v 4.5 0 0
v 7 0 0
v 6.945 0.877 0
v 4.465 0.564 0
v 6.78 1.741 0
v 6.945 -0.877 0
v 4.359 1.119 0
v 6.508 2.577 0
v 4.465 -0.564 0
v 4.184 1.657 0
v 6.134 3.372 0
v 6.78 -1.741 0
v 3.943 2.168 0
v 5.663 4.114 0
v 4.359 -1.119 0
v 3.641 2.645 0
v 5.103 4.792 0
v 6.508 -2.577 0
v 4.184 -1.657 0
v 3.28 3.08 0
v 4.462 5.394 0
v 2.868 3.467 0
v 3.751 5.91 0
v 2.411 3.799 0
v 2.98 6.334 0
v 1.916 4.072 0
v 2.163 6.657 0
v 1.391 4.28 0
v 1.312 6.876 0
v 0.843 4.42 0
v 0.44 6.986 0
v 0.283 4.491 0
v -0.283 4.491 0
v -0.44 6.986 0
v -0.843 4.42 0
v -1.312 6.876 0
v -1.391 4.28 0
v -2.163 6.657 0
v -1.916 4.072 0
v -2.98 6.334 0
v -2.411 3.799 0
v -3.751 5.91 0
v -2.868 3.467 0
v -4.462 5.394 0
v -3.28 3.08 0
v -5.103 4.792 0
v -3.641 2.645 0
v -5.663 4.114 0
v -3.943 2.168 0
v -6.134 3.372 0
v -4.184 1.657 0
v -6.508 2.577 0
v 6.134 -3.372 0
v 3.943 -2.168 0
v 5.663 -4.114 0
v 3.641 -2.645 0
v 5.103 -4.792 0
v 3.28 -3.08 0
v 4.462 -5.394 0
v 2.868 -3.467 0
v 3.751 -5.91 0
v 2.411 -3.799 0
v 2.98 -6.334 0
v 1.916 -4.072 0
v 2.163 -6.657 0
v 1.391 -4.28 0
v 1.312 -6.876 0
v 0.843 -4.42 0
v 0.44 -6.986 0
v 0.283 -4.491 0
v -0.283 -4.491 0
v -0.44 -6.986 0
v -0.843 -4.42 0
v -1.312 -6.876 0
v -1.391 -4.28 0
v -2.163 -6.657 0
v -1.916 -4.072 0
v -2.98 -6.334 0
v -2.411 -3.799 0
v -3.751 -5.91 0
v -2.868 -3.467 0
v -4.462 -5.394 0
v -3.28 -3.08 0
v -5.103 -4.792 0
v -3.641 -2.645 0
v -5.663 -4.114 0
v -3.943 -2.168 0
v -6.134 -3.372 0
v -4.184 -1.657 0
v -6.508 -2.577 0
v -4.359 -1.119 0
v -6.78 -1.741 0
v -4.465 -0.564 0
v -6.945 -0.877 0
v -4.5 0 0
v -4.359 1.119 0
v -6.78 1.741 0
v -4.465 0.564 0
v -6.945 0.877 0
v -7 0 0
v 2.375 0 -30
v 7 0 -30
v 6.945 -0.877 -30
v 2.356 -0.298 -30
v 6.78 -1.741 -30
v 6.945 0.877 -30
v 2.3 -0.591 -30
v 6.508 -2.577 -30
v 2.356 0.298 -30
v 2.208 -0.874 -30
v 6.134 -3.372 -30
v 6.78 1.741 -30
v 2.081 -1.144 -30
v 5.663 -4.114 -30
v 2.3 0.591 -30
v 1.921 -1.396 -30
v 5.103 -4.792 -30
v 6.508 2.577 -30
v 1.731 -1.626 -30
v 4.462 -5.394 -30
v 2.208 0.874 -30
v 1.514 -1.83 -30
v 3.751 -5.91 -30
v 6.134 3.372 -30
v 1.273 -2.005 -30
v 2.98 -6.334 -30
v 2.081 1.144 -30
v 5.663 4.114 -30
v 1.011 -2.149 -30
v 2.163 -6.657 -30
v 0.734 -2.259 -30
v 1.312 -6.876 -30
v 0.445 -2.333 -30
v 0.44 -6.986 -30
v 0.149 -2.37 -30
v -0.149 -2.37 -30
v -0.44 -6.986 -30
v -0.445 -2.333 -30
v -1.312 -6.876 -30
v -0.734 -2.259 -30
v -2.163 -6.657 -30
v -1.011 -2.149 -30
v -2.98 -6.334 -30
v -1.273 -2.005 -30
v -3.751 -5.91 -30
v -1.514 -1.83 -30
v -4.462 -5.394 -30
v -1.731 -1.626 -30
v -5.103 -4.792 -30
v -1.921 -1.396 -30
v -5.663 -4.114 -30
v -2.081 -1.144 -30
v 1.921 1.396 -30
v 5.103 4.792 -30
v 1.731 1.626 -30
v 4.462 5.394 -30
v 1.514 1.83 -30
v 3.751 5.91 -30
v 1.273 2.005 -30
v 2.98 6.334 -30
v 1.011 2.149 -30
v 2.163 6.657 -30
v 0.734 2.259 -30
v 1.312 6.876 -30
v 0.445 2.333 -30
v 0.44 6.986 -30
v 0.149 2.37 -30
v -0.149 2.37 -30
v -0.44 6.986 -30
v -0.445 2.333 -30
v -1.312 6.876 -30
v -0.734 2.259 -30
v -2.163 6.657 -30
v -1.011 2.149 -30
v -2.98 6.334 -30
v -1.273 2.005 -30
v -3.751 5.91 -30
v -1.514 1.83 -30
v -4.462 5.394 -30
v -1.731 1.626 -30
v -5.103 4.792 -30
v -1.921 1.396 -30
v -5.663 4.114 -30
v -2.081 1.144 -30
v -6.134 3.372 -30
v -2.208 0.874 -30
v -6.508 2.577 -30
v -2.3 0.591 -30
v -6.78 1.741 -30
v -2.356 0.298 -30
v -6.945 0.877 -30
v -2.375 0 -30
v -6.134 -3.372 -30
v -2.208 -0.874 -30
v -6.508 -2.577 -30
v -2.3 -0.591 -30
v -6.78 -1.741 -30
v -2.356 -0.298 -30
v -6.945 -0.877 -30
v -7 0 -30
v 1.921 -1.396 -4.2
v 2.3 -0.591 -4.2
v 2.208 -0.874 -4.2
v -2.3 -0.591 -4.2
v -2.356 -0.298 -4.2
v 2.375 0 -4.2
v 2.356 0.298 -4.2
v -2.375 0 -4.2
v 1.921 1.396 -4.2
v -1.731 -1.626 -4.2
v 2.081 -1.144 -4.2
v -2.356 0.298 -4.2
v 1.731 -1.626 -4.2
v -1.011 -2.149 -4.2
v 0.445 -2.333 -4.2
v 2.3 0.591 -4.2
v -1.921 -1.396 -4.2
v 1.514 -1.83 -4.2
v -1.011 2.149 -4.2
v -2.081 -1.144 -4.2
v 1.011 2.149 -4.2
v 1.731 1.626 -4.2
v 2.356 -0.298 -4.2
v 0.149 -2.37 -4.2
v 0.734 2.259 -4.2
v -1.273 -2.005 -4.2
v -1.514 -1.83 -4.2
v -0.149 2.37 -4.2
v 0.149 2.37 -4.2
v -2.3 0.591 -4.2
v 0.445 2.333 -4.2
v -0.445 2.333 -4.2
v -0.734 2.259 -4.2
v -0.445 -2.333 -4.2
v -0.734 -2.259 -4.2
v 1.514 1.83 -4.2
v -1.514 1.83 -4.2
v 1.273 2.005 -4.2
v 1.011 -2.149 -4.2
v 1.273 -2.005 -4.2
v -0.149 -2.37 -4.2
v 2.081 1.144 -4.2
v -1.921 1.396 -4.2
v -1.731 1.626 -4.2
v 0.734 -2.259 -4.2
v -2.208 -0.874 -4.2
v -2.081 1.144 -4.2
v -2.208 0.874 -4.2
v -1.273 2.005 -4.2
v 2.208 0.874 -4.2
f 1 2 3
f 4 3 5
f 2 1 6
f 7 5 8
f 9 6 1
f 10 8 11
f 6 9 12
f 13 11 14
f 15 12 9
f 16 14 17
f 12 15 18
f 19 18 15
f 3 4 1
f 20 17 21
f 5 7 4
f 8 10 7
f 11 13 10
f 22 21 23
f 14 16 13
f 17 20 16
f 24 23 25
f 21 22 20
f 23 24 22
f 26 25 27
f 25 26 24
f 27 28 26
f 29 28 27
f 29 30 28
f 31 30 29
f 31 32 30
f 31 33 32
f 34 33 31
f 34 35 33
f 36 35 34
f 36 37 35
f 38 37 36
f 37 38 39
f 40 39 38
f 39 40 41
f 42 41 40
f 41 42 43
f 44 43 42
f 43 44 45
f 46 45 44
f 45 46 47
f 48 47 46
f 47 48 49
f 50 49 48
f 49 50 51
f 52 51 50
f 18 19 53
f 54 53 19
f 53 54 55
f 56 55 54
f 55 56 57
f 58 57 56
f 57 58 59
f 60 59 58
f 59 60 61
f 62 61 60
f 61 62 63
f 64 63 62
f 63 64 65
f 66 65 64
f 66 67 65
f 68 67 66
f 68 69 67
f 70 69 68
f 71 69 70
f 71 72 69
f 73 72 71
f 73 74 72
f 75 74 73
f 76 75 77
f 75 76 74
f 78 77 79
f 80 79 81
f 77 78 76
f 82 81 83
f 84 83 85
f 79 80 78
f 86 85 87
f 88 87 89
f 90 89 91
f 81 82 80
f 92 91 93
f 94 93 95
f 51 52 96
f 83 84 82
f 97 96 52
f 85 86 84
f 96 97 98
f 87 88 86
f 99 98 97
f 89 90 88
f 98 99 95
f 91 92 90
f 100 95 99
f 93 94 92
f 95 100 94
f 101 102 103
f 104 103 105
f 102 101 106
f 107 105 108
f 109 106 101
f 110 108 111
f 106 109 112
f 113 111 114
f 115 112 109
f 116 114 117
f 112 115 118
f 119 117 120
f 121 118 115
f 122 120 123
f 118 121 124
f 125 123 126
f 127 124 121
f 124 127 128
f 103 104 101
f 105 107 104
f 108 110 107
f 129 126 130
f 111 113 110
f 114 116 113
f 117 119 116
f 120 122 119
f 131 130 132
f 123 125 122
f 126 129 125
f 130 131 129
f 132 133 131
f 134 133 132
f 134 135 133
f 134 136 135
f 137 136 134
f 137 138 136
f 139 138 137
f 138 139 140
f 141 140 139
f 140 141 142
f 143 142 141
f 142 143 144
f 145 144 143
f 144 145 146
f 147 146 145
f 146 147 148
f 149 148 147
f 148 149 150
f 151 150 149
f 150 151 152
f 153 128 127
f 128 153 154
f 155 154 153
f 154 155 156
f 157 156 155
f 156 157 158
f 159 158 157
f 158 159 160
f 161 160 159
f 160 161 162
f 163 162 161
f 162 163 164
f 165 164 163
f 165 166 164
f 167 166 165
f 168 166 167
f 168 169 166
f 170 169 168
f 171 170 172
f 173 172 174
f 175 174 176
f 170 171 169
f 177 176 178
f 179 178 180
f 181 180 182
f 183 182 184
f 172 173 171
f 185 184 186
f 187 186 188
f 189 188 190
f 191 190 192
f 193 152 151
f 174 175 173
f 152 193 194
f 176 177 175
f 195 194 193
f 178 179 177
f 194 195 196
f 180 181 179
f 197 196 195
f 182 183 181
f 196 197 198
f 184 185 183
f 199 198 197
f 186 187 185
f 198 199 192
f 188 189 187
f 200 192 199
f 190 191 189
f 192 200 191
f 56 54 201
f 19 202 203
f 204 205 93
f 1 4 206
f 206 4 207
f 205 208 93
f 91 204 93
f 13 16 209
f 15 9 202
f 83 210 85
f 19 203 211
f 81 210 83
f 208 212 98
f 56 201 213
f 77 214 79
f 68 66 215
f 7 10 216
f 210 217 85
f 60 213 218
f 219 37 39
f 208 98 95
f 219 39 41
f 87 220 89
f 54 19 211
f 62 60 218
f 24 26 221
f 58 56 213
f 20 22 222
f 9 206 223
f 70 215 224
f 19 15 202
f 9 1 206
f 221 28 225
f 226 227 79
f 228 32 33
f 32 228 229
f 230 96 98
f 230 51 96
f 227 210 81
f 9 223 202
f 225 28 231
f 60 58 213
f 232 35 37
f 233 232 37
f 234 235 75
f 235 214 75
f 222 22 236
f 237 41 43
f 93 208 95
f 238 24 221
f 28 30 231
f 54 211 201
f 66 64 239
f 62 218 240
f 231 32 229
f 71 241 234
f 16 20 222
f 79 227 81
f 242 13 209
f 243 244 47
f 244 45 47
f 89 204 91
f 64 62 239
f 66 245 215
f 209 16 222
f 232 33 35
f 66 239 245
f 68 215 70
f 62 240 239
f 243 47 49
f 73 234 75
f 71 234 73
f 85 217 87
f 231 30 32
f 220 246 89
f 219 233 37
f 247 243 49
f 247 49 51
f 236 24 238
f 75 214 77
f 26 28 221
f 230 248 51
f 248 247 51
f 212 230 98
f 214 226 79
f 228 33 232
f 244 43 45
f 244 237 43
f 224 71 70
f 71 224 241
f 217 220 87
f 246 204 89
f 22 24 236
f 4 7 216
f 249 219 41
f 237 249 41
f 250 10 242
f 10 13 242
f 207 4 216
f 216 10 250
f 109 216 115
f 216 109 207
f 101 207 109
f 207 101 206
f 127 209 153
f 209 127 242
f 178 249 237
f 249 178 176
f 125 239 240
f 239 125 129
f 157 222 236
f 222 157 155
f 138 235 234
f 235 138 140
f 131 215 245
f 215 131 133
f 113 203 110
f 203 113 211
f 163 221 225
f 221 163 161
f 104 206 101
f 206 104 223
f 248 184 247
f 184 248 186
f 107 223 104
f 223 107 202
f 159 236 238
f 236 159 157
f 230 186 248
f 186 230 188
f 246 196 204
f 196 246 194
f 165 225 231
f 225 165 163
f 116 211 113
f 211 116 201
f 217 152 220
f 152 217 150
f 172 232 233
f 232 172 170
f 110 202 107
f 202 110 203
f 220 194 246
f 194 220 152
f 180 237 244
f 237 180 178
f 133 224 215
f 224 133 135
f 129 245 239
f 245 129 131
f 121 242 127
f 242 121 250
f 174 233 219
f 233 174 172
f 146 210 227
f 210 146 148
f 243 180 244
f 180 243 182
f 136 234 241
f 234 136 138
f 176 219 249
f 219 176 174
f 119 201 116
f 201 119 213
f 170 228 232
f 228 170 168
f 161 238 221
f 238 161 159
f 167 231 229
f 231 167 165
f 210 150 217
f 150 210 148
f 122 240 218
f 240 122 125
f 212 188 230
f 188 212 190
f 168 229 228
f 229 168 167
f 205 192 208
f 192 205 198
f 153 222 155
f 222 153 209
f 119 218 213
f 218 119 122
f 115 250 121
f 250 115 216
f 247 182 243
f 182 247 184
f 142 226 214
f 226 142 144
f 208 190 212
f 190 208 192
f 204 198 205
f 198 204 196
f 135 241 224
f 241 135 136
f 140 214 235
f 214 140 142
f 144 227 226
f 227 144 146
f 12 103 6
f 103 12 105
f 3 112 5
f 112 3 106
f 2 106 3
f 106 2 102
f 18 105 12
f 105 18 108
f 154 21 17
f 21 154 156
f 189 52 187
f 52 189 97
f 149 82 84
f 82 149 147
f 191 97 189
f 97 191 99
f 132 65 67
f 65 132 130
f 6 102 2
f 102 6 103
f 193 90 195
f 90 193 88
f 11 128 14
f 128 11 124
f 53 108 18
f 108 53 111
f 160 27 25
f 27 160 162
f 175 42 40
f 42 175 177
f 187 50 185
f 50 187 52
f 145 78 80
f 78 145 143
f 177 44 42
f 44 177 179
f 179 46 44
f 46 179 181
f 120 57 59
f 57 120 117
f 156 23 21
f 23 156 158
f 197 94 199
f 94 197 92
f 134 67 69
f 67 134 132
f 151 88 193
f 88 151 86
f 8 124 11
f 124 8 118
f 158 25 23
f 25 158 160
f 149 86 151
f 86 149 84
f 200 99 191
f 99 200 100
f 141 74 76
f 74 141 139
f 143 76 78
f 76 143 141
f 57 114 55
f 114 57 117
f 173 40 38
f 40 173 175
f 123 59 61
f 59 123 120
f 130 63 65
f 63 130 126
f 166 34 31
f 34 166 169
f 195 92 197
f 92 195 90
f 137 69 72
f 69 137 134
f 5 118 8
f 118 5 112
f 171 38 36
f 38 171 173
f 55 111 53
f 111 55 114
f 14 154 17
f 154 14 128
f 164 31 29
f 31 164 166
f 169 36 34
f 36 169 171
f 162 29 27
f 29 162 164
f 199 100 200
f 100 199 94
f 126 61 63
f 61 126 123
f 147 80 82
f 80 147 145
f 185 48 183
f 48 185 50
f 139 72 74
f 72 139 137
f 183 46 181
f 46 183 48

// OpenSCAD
$fn = 50;


difference() {
	union() {
		translate(v = [0, 0, -30.0000000000]) {
			cylinder(h = 30, r = 7.0000000000);
		}
	}
	union() {
		translate(v = [0, 0, 0]) {
			rotate(a = [0, 0, 0]) {
				difference() {
					union() {
						#translate(v = [0, 0, -30.0000000000]) {
							cylinder(h = 30, r = 2.2500000000);
						}
						#translate(v = [0, 0, -4.2000000000]) {
							cylinder(h = 4.2000000000, r1 = 2.3750000000, r2 = 4.5000000000);
						}
						#translate(v = [0, 0, -30.0000000000]) {
							cylinder(h = 30, r = 2.3750000000);
						}
						#translate(v = [0, 0, -30.0000000000]) {
							cylinder(h = 30, r = 2.2500000000);
						}
					}
					union();
				}
			}
		}
	}
}
